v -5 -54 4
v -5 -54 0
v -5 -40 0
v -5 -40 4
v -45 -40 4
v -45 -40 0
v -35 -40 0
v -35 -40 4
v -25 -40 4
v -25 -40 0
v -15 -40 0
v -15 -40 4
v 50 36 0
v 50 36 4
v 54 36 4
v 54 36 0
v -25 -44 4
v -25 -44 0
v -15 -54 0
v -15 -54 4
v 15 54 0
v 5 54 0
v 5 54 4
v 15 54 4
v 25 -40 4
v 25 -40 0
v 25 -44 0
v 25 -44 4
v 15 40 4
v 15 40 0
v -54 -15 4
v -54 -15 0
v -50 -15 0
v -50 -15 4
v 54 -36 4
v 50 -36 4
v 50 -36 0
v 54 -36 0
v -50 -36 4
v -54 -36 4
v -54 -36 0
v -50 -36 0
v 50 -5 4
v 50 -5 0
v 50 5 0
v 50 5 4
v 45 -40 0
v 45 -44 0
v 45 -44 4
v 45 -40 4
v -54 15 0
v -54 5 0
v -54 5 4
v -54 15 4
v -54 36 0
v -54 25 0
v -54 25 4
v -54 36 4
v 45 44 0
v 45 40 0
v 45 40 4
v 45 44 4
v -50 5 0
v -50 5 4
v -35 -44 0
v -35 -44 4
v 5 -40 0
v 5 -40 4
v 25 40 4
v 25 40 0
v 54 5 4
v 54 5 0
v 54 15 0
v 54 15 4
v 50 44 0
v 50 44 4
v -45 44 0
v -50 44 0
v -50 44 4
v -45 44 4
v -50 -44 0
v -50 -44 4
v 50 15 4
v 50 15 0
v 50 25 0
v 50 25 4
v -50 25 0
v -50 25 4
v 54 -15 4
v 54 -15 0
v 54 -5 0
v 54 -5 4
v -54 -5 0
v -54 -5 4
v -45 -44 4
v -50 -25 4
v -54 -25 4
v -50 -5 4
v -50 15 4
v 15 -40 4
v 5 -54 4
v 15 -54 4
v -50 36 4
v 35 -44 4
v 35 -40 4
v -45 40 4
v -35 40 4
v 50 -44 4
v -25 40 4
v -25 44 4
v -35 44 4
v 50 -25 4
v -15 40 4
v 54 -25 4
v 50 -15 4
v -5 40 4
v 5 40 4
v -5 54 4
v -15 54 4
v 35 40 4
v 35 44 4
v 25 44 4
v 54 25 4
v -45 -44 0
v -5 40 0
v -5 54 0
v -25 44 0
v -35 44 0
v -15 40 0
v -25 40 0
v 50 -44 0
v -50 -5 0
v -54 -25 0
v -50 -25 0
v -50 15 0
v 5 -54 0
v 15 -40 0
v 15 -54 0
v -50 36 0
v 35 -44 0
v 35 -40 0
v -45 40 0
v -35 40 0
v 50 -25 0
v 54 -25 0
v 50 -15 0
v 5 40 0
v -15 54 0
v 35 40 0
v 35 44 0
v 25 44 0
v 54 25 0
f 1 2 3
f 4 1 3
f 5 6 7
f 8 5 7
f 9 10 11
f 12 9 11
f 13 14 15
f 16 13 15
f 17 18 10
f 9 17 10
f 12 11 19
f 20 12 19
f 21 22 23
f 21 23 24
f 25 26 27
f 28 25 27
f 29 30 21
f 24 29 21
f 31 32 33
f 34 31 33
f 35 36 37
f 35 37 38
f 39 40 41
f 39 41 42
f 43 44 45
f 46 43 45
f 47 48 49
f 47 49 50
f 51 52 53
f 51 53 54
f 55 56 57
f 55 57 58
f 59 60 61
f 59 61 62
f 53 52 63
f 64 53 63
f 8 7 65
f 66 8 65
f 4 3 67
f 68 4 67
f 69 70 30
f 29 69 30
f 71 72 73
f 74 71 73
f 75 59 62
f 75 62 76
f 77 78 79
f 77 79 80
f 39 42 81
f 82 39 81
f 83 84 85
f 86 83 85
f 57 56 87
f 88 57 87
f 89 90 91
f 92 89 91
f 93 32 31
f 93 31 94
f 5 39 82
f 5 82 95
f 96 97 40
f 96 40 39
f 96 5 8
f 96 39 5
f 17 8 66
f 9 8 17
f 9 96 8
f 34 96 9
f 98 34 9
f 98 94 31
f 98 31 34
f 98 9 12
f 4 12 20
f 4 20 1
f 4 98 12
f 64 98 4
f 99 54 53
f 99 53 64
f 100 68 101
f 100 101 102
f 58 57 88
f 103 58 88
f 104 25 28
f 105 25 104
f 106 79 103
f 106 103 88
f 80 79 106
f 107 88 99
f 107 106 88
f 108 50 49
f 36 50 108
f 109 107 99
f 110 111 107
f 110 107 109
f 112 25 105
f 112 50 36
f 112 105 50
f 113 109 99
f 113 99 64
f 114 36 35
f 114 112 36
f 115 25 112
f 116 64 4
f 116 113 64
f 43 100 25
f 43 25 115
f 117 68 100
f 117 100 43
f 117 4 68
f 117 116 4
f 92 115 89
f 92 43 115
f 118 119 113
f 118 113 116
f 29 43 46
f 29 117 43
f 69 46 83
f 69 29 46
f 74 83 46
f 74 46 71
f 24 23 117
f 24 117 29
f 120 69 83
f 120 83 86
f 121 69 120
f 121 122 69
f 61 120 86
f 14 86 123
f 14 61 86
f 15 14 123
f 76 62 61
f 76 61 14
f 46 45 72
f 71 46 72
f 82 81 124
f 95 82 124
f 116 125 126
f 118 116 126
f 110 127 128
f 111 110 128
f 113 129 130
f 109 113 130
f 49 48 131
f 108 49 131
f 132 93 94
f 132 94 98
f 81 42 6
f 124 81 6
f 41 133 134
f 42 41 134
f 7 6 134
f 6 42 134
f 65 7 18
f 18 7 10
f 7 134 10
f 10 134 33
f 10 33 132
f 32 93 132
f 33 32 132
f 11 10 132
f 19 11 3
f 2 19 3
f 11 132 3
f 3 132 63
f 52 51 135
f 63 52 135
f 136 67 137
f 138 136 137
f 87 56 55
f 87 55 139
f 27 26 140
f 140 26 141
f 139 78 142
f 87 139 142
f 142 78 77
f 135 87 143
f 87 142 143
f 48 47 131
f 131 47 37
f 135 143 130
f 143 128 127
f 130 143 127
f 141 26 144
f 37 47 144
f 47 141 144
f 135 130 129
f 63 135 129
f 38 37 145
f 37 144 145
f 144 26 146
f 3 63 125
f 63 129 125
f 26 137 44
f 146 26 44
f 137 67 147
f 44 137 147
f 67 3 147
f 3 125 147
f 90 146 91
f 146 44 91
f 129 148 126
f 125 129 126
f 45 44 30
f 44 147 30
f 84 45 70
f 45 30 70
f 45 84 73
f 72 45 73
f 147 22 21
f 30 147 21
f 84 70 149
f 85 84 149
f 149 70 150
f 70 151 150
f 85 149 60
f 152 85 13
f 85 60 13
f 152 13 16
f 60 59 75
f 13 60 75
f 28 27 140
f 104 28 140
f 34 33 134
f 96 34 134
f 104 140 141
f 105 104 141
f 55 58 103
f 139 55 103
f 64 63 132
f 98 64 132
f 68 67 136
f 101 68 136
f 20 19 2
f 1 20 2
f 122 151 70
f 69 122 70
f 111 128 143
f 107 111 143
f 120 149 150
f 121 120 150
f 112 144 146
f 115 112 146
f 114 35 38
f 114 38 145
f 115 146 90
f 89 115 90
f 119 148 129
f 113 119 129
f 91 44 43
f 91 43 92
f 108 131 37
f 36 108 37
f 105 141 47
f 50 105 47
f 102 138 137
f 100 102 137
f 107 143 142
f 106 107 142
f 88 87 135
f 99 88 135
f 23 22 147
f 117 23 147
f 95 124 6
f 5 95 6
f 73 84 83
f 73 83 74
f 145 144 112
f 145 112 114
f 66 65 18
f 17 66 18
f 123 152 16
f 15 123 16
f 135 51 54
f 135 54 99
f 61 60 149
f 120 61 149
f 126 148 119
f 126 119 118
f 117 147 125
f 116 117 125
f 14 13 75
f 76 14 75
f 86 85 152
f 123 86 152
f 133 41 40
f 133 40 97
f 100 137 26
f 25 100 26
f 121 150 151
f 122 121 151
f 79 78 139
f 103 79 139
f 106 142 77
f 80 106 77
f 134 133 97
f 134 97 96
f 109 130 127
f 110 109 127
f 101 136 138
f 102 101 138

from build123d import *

# Parameters (mm, degrees)
SKETCH1_W           = 5
SKETCH1_H           = 4
SKETCH1_W_2         = 4
SKETCH1_H_2         = 10
SKETCH1_W_3         = 10
BOSS_EXTRUDE1_DEPTH = 4
SKETCH2_W           = 4
SKETCH2_H           = 1
BOSS_EXTRUDE2_DEPTH = 4


with BuildPart() as part:
    # Sketch1 → Boss-Extrude1 (new body)
    with BuildSketch(Plane.XY):
        with Locations((-47.5, 42)):
            Rectangle(SKETCH1_W, SKETCH1_H)
        Polygon((-45, 40), (-50, 40), (-50, 35), (-46, 35), (-46, 25), (-50, 25), (-50, 20), (-50, 15), (-46, 15), (-46, 5), (-50, 5), (-50, 0), (-50, -5), (-46, -5), (-46, -15), (-50, -15), (-50, -20), (-50, -25), (-46, -25), (-46, -35), (-50, -35), (-50, -40), (-45, -40), (-40, -40), (-35, -40), (-30, -40), (-25, -40), (-20, -40), (-15, -40), (-10, -40), (-5, -40), (0, -40), (5, -40), (10, -40), (15, -40), (20, -40), (25, -40), (30, -40), (35, -40), (40, -40), (45, -40), (50, -40), (50, -35), (46, -35), (46, -25), (50, -25), (50, -20), (50, -15), (46, -15), (46, -5), (50, -5), (50, 0), (50, 5), (46, 5), (46, 15), (50, 15), (50, 20), (50, 25), (46, 25), (46, 35), (50, 35), (50, 40), (45, 40), (40, 40), (35, 40), (30, 40), (25, 40), (20, 40), (15, 40), (10, 40), (5, 40), (0, 40), (-5, 40), (-10, 40), (-15, 40), (-20, 40), (-25, 40), (-30, 40), (-35, 40), (-40, 40), align=None)
        with Locations((-48, 30)):
            Rectangle(SKETCH1_W_2, SKETCH1_H_2)
        with Locations((-52, 30)):
            Rectangle(SKETCH1_W_2, SKETCH1_H_2)
        Polygon((-35, 44), (-35, 40), (-30, 40), (-25, 40), (-25, 44), align=None)
        with Locations((-48, 10)):
            Rectangle(SKETCH1_W_2, SKETCH1_H_2)
        with Locations((-52, 10)):
            Rectangle(SKETCH1_W_2, SKETCH1_H_2)
        Polygon((-15, 44), (-15, 40), (-10, 40), (-5, 40), (-5, 44), align=None)
        with Locations((-48, -10)):
            Rectangle(SKETCH1_W_2, SKETCH1_H_2)
        with Locations((-52, -10)):
            Rectangle(SKETCH1_W_2, SKETCH1_H_2)
        with Locations((-10, 49)):
            Rectangle(SKETCH1_W_3, SKETCH1_H_2)
        with Locations((-48, -30)):
            Rectangle(SKETCH1_W_2, SKETCH1_H_2)
        with Locations((-52, -30)):
            Rectangle(SKETCH1_W_2, SKETCH1_H_2)
        Polygon((5, 44), (5, 40), (10, 40), (15, 40), (15, 44), align=None)
        with Locations((10, 49)):
            Rectangle(SKETCH1_W_3, SKETCH1_H_2)
        with Locations((-47.5, -42)):
            Rectangle(SKETCH1_W, SKETCH1_H)
        Polygon((25, 44), (25, 40), (30, 40), (35, 40), (35, 44), align=None)
        Polygon((-30, -40), (-35, -40), (-35, -44), (-25, -44), (-25, -40), align=None)
        with Locations((47.5, 42)):
            Rectangle(SKETCH1_W, SKETCH1_H)
        Polygon((-10, -40), (-15, -40), (-15, -44), (-5, -44), (-5, -40), align=None)
        with Locations((-10, -49)):
            Rectangle(SKETCH1_W_3, SKETCH1_H_2)
        with Locations((52, 30)):
            Rectangle(SKETCH1_W_2, SKETCH1_H_2)
        with Locations((48, 30)):
            Rectangle(SKETCH1_W_2, SKETCH1_H_2)
        Polygon((10, -40), (5, -40), (5, -44), (15, -44), (15, -40), align=None)
        with Locations((52, 10)):
            Rectangle(SKETCH1_W_2, SKETCH1_H_2)
        with Locations((48, 10)):
            Rectangle(SKETCH1_W_2, SKETCH1_H_2)
        with Locations((10, -49)):
            Rectangle(SKETCH1_W_3, SKETCH1_H_2)
        with Locations((52, -10)):
            Rectangle(SKETCH1_W_2, SKETCH1_H_2)
        with Locations((48, -10)):
            Rectangle(SKETCH1_W_2, SKETCH1_H_2)
        Polygon((30, -40), (25, -40), (25, -44), (35, -44), (35, -40), align=None)
        with Locations((52, -30)):
            Rectangle(SKETCH1_W_2, SKETCH1_H_2)
        with Locations((48, -30)):
            Rectangle(SKETCH1_W_2, SKETCH1_H_2)
        with Locations((47.5, -42)):
            Rectangle(SKETCH1_W, SKETCH1_H)
    extrude(amount=BOSS_EXTRUDE1_DEPTH)

    # Sketch2 → Boss-Extrude2 (add)
    with BuildSketch(Plane.XY.offset(4)):
        with Locations((52, -35.5)):
            Rectangle(SKETCH2_W, SKETCH2_H)
        with Locations((52, 35.5)):
            Rectangle(SKETCH2_W, SKETCH2_H)
        with Locations((-52, -35.5)):
            Rectangle(SKETCH2_W, SKETCH2_H)
        with Locations((-52, 35.5)):
            Rectangle(SKETCH2_W, SKETCH2_H)
    extrude(amount=-BOSS_EXTRUDE2_DEPTH)


solid = part.part
